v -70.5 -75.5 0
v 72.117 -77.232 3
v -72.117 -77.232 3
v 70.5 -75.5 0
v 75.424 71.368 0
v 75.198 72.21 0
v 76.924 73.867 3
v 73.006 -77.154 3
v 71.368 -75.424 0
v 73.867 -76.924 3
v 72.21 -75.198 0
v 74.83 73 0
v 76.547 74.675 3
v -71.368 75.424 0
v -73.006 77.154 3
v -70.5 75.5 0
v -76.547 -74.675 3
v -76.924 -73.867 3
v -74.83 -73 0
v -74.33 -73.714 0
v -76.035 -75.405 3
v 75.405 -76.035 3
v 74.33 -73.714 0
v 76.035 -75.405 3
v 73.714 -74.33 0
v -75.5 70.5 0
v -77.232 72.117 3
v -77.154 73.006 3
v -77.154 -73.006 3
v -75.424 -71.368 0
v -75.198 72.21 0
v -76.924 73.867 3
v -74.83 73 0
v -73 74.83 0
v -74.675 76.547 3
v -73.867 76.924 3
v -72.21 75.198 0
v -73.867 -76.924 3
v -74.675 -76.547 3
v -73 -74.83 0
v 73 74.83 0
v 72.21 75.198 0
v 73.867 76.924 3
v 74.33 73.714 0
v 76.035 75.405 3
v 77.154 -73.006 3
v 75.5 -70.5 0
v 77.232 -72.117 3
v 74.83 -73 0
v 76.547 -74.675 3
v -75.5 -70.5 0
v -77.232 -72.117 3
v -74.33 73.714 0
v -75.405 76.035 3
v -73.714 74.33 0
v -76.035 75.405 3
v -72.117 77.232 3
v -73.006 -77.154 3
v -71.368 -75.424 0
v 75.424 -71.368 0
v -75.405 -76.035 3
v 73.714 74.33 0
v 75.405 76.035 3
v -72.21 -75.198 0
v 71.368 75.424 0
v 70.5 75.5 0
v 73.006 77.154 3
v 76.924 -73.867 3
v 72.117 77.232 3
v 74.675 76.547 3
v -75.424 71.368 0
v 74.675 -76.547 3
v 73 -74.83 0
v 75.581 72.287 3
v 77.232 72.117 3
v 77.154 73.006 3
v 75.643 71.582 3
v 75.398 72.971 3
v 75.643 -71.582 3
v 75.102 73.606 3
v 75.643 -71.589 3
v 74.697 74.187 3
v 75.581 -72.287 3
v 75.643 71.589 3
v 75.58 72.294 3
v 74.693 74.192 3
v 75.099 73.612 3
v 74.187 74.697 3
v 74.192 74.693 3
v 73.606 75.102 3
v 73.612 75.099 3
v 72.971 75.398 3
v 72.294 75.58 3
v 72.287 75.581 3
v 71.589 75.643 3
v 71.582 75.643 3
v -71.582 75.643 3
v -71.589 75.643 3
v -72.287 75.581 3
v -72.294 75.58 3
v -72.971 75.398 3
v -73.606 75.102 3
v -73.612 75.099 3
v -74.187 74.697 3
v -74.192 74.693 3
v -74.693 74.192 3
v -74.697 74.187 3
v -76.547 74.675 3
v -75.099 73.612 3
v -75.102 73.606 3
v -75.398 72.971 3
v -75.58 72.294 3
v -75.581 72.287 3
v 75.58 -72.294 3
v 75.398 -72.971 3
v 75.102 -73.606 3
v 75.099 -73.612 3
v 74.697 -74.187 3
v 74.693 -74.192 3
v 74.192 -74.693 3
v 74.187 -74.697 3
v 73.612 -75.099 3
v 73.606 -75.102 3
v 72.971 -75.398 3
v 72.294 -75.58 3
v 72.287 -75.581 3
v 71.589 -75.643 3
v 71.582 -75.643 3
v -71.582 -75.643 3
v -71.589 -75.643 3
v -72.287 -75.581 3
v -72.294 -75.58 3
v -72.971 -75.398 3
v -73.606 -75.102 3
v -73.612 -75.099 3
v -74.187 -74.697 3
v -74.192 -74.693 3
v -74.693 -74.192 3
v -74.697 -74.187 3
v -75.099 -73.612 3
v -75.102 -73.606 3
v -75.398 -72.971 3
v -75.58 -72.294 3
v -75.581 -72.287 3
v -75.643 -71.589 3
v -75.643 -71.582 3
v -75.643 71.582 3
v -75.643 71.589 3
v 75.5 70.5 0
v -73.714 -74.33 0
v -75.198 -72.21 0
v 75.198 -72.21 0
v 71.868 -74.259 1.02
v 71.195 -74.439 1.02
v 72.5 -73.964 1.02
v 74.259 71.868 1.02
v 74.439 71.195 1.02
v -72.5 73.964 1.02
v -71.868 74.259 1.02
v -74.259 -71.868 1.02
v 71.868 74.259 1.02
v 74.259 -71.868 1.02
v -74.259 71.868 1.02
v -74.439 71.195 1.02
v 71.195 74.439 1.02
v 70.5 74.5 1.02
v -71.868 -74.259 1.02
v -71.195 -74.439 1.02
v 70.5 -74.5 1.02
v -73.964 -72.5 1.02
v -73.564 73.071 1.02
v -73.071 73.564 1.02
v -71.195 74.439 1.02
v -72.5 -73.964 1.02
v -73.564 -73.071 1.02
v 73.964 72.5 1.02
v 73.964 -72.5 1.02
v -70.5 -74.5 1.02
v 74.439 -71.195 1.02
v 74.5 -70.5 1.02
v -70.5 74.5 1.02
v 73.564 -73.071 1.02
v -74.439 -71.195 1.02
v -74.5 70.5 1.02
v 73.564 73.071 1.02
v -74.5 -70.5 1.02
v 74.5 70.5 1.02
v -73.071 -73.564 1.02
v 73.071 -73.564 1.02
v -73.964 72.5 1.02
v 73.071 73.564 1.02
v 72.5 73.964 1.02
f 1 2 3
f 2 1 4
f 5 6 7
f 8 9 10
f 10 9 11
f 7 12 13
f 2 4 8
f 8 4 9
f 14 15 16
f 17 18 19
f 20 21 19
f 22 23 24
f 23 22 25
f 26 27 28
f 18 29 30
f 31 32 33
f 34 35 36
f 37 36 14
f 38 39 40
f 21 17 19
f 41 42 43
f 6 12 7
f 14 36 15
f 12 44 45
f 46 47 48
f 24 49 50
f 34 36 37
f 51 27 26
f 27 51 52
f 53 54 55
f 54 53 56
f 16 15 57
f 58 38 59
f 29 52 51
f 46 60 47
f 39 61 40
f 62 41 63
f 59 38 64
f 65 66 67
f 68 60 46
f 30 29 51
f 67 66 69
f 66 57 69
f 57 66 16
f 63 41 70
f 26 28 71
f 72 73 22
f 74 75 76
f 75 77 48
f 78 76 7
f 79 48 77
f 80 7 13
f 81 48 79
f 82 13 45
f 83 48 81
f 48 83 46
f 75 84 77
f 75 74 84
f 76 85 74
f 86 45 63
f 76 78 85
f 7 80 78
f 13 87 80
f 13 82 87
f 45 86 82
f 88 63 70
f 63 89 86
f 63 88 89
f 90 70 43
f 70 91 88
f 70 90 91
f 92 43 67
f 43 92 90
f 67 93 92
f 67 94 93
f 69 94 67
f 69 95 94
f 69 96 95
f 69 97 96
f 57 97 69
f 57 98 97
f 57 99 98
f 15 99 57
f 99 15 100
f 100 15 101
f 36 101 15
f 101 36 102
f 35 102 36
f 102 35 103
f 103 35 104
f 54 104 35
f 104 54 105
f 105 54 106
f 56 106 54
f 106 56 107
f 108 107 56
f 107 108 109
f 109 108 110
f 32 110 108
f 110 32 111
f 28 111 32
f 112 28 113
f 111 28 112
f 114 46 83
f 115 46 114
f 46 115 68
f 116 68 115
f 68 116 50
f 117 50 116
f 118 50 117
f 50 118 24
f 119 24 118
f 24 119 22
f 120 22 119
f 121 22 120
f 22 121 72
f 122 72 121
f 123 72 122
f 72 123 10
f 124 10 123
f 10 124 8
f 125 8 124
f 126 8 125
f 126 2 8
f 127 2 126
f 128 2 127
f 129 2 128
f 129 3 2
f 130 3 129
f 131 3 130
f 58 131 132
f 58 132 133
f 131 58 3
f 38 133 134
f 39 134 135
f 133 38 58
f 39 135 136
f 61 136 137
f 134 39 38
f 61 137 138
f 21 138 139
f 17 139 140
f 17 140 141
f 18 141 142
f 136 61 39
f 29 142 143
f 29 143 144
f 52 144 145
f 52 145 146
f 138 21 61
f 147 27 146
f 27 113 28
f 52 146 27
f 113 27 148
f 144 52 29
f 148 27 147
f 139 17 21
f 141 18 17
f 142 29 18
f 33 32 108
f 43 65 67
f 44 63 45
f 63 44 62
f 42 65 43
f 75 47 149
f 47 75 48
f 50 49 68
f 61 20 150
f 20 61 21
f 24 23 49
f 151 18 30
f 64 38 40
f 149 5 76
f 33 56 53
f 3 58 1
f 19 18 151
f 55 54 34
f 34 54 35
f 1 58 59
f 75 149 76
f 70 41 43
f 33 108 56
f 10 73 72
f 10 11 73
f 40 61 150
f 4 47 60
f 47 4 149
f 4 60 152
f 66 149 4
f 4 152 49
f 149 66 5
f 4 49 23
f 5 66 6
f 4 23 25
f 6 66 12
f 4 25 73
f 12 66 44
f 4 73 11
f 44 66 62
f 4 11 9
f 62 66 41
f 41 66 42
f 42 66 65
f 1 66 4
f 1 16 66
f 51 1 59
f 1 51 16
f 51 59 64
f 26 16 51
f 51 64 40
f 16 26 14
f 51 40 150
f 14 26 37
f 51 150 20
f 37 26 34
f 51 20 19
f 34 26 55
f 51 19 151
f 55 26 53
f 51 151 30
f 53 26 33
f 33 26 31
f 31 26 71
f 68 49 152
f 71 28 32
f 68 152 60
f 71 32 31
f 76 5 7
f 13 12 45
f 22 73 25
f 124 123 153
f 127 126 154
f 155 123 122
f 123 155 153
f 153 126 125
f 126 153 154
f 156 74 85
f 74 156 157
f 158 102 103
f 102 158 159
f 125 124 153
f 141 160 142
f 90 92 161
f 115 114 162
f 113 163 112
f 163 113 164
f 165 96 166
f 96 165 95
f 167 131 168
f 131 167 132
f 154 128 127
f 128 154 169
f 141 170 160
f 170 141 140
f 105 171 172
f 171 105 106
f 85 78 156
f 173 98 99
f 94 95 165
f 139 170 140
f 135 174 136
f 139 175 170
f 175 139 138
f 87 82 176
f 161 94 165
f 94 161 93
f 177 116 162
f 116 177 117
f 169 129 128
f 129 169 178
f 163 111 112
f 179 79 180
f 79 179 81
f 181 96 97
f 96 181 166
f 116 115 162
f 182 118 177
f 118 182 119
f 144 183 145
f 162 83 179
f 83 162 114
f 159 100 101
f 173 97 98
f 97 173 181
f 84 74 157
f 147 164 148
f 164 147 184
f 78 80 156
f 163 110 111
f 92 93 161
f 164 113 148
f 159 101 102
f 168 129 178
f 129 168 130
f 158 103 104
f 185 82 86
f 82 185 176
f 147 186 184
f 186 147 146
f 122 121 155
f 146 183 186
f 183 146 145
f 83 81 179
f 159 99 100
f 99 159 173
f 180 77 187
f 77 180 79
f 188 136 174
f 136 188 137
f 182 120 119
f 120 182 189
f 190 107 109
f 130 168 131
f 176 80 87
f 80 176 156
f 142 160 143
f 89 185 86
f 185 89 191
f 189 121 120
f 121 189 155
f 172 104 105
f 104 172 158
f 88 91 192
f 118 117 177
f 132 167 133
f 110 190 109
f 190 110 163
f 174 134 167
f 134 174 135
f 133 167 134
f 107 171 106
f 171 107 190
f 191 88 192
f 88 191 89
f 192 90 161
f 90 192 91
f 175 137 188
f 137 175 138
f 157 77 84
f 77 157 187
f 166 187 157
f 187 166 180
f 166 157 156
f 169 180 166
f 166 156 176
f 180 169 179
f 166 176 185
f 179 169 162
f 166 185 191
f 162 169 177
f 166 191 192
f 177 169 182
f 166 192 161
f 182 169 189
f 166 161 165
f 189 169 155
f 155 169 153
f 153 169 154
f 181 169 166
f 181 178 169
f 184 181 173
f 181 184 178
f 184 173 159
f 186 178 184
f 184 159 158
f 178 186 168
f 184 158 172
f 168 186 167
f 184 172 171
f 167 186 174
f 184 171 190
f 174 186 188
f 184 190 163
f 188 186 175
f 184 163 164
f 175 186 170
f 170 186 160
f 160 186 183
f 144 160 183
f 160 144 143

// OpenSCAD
E = 0.02;


module lExtrude(height, width, angle) {
    function lScale(angle, width, height) = 1 + 2 * tan(angle) * height / width;

    linear_extrude(height, scale = lScale(angle, width, height))
        children();
}


module fillet(r) {
    $fn = 36;

    offset(r)
    offset(- r)
        children();
}


module tray() {
    width = 150;
    height = 3;
    depth = 2;
    rounding = 5;
    wall = 1;
    angle = 30; // Degrees

    difference() {
        lExtrude(height, width + wall, angle)
        fillet(rounding)
            square(width + wall, center = true);

        translate([0, 0, height - depth + E])
        lExtrude(depth, width - wall, angle)
        fillet(rounding - wall)
            square(width - wall, center = true);
    }
}


tray();
